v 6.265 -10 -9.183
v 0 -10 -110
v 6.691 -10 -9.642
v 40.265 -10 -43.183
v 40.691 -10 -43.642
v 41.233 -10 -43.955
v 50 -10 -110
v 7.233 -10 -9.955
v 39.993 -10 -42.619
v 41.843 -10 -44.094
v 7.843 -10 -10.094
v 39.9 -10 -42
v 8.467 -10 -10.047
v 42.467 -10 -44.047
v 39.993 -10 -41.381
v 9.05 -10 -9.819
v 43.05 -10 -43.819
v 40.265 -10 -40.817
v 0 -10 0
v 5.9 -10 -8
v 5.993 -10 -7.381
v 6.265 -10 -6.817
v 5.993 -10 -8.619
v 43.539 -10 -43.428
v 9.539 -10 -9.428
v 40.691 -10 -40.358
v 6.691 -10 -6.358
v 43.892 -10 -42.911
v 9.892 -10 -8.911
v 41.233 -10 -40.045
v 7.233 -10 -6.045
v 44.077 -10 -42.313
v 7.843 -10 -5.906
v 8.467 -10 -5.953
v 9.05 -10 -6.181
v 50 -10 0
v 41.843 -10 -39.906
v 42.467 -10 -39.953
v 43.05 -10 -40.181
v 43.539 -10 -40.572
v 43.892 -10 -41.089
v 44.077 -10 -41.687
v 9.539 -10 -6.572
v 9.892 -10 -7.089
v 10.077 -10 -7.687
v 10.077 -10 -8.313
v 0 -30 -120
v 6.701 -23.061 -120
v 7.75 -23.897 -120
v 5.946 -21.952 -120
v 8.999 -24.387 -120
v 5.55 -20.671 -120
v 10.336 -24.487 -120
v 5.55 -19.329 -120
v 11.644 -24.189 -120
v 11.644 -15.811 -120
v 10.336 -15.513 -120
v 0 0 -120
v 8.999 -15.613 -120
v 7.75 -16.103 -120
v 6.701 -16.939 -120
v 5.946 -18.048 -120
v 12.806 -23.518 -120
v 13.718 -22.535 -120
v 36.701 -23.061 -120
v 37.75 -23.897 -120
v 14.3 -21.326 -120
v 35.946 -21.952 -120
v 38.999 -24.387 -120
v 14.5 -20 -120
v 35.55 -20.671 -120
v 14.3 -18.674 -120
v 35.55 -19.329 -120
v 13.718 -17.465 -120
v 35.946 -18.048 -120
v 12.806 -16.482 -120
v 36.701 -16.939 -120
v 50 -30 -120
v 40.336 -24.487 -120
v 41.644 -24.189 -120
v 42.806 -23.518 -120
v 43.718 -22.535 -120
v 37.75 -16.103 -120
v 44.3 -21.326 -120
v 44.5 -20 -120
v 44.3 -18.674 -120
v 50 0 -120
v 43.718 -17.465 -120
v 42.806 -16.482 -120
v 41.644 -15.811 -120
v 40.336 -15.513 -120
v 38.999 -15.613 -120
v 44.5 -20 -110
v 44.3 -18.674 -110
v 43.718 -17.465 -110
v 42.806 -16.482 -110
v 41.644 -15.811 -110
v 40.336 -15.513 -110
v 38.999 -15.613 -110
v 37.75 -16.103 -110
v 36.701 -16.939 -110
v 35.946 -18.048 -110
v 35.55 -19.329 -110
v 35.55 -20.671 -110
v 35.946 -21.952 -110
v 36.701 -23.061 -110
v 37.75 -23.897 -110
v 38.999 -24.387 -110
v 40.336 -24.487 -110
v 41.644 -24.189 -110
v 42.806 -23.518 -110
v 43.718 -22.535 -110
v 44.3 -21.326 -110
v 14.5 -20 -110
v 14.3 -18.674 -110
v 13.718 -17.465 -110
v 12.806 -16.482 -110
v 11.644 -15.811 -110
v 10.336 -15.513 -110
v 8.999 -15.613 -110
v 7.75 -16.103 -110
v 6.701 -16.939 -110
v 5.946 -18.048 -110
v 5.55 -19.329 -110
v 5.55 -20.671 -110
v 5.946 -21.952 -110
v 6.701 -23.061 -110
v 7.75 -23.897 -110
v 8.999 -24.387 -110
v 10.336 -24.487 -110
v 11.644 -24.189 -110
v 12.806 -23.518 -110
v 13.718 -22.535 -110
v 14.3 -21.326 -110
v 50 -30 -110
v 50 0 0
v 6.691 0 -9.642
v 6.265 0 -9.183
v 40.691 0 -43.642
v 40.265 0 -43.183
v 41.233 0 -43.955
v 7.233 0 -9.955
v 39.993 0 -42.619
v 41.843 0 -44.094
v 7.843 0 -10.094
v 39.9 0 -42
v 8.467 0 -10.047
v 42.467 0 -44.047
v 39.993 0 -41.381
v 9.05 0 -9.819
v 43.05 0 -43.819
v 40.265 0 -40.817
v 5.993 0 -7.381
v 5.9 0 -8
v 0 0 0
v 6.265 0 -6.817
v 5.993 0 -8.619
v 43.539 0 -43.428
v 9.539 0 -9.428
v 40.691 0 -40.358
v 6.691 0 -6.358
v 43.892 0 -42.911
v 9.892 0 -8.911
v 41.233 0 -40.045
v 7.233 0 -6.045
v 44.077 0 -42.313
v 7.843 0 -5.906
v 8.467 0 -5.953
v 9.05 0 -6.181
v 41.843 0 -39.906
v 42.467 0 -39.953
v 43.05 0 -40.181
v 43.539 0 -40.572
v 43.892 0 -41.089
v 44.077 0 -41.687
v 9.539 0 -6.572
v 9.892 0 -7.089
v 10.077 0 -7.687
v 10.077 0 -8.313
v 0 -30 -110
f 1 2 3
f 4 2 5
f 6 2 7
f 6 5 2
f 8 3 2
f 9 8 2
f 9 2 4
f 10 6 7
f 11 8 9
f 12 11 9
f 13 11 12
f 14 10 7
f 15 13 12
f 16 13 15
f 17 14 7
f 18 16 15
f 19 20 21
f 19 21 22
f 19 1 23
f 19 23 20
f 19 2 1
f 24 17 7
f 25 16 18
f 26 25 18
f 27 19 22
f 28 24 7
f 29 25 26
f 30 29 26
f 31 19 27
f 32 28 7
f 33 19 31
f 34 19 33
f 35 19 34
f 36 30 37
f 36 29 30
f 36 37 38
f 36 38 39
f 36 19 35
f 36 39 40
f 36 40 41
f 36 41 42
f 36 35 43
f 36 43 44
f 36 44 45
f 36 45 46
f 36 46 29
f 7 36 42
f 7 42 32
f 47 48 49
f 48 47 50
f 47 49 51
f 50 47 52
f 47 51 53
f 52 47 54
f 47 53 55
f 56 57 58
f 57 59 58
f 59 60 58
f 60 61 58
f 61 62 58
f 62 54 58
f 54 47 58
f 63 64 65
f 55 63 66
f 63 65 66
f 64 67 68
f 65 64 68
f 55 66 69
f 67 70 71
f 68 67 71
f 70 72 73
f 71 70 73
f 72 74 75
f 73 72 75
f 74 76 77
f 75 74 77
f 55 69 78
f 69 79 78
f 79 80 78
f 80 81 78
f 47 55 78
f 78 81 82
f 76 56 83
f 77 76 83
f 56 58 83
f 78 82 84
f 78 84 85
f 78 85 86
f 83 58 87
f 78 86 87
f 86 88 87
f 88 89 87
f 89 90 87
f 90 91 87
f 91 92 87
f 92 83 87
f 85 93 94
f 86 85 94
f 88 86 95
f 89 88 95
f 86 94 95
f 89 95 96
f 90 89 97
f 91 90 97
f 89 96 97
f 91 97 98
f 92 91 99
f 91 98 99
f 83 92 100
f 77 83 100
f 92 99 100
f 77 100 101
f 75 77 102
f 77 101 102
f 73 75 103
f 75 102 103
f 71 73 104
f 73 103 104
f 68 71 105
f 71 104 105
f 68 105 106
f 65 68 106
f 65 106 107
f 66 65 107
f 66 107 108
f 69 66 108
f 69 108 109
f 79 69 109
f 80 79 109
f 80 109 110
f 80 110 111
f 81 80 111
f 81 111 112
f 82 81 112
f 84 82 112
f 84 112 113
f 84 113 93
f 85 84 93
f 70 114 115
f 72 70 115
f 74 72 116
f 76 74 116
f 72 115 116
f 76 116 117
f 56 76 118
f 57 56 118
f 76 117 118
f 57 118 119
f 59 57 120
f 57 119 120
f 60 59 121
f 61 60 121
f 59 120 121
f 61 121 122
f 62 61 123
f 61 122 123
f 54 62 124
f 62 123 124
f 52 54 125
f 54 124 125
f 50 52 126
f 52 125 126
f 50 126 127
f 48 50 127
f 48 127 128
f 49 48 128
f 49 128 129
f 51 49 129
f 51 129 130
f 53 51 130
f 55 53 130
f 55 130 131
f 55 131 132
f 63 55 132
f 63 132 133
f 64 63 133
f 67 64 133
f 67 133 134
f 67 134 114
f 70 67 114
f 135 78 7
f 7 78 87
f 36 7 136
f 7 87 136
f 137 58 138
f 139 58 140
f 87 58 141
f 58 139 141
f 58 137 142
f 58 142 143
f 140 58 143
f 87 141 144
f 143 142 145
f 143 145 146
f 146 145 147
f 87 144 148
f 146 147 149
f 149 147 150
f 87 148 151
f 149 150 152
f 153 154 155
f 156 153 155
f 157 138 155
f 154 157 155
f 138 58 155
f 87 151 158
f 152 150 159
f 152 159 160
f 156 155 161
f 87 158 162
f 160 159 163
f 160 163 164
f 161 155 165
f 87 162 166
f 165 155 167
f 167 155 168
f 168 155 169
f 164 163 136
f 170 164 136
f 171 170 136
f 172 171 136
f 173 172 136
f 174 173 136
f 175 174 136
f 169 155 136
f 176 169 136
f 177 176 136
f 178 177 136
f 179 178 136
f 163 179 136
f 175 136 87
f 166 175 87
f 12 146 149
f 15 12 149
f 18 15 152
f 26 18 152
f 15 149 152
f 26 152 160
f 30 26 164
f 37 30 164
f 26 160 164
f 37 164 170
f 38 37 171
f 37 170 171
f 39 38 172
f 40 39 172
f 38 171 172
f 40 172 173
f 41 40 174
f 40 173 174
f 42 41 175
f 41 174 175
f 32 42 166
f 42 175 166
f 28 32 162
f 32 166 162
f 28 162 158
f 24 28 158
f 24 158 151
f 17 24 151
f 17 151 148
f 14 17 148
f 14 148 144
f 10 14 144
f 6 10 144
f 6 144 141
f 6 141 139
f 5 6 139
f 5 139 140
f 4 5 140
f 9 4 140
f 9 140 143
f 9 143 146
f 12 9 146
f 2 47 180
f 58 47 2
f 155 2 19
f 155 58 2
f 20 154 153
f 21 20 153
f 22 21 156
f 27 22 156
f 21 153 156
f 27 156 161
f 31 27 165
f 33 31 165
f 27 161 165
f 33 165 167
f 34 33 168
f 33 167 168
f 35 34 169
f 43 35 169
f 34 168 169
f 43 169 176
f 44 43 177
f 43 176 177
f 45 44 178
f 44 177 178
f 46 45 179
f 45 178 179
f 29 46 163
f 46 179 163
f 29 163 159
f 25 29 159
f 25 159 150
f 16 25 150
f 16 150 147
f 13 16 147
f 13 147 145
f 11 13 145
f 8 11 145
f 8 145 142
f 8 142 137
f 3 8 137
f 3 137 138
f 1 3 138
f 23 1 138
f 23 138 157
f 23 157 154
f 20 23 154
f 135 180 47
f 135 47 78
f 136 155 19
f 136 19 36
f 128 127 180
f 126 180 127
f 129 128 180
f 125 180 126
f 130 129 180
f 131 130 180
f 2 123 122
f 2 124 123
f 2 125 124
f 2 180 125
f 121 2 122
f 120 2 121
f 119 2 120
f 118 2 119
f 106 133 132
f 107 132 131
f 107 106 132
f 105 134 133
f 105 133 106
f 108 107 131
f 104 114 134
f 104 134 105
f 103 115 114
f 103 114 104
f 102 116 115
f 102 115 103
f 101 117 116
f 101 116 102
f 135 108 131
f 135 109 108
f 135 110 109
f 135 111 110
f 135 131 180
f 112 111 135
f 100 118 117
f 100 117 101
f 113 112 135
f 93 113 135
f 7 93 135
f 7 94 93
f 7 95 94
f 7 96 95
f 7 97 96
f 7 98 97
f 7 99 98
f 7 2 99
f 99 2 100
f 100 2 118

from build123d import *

# Parameters (mm, degrees)
F0_W     = 50
F0_H     = 120
F1_DEPTH = 10
F2_W     = 50
F2_H     = 10
F3_DEPTH = 20
F4_R     = 4.5
F5_DEPTH = 10.001
F7_D     = 4.2


with BuildPart() as f1:
    # F0 (on Front) → F1 (new body)
    with BuildSketch(Plane.XZ):
        with Locations((25, -60)):
            Rectangle(F0_W, F0_H)
    extrude(amount=F1_DEPTH)

    # F2 (on face) → F3 (join)
    with BuildSketch(Plane.XZ.offset(10)):
        with Locations((25, -115)):
            Rectangle(F2_W, F2_H)
    extrude(amount=F3_DEPTH)

    # F4 (on face) → F5 (cut, through all)
    with BuildSketch(Plane.XY.offset(-110)):
        with Locations((10, -20)):
            Circle(F4_R)
        with Locations((40, -20)):
            Circle(F4_R)
    extrude(amount=-F5_DEPTH, mode=Mode.SUBTRACT)

    # F7 (through all)
    with Locations(Plane.XZ.offset(10)):
        with Locations((8, -8), (42, -42)):
            Hole(F7_D / 2)


solid = f1.part
